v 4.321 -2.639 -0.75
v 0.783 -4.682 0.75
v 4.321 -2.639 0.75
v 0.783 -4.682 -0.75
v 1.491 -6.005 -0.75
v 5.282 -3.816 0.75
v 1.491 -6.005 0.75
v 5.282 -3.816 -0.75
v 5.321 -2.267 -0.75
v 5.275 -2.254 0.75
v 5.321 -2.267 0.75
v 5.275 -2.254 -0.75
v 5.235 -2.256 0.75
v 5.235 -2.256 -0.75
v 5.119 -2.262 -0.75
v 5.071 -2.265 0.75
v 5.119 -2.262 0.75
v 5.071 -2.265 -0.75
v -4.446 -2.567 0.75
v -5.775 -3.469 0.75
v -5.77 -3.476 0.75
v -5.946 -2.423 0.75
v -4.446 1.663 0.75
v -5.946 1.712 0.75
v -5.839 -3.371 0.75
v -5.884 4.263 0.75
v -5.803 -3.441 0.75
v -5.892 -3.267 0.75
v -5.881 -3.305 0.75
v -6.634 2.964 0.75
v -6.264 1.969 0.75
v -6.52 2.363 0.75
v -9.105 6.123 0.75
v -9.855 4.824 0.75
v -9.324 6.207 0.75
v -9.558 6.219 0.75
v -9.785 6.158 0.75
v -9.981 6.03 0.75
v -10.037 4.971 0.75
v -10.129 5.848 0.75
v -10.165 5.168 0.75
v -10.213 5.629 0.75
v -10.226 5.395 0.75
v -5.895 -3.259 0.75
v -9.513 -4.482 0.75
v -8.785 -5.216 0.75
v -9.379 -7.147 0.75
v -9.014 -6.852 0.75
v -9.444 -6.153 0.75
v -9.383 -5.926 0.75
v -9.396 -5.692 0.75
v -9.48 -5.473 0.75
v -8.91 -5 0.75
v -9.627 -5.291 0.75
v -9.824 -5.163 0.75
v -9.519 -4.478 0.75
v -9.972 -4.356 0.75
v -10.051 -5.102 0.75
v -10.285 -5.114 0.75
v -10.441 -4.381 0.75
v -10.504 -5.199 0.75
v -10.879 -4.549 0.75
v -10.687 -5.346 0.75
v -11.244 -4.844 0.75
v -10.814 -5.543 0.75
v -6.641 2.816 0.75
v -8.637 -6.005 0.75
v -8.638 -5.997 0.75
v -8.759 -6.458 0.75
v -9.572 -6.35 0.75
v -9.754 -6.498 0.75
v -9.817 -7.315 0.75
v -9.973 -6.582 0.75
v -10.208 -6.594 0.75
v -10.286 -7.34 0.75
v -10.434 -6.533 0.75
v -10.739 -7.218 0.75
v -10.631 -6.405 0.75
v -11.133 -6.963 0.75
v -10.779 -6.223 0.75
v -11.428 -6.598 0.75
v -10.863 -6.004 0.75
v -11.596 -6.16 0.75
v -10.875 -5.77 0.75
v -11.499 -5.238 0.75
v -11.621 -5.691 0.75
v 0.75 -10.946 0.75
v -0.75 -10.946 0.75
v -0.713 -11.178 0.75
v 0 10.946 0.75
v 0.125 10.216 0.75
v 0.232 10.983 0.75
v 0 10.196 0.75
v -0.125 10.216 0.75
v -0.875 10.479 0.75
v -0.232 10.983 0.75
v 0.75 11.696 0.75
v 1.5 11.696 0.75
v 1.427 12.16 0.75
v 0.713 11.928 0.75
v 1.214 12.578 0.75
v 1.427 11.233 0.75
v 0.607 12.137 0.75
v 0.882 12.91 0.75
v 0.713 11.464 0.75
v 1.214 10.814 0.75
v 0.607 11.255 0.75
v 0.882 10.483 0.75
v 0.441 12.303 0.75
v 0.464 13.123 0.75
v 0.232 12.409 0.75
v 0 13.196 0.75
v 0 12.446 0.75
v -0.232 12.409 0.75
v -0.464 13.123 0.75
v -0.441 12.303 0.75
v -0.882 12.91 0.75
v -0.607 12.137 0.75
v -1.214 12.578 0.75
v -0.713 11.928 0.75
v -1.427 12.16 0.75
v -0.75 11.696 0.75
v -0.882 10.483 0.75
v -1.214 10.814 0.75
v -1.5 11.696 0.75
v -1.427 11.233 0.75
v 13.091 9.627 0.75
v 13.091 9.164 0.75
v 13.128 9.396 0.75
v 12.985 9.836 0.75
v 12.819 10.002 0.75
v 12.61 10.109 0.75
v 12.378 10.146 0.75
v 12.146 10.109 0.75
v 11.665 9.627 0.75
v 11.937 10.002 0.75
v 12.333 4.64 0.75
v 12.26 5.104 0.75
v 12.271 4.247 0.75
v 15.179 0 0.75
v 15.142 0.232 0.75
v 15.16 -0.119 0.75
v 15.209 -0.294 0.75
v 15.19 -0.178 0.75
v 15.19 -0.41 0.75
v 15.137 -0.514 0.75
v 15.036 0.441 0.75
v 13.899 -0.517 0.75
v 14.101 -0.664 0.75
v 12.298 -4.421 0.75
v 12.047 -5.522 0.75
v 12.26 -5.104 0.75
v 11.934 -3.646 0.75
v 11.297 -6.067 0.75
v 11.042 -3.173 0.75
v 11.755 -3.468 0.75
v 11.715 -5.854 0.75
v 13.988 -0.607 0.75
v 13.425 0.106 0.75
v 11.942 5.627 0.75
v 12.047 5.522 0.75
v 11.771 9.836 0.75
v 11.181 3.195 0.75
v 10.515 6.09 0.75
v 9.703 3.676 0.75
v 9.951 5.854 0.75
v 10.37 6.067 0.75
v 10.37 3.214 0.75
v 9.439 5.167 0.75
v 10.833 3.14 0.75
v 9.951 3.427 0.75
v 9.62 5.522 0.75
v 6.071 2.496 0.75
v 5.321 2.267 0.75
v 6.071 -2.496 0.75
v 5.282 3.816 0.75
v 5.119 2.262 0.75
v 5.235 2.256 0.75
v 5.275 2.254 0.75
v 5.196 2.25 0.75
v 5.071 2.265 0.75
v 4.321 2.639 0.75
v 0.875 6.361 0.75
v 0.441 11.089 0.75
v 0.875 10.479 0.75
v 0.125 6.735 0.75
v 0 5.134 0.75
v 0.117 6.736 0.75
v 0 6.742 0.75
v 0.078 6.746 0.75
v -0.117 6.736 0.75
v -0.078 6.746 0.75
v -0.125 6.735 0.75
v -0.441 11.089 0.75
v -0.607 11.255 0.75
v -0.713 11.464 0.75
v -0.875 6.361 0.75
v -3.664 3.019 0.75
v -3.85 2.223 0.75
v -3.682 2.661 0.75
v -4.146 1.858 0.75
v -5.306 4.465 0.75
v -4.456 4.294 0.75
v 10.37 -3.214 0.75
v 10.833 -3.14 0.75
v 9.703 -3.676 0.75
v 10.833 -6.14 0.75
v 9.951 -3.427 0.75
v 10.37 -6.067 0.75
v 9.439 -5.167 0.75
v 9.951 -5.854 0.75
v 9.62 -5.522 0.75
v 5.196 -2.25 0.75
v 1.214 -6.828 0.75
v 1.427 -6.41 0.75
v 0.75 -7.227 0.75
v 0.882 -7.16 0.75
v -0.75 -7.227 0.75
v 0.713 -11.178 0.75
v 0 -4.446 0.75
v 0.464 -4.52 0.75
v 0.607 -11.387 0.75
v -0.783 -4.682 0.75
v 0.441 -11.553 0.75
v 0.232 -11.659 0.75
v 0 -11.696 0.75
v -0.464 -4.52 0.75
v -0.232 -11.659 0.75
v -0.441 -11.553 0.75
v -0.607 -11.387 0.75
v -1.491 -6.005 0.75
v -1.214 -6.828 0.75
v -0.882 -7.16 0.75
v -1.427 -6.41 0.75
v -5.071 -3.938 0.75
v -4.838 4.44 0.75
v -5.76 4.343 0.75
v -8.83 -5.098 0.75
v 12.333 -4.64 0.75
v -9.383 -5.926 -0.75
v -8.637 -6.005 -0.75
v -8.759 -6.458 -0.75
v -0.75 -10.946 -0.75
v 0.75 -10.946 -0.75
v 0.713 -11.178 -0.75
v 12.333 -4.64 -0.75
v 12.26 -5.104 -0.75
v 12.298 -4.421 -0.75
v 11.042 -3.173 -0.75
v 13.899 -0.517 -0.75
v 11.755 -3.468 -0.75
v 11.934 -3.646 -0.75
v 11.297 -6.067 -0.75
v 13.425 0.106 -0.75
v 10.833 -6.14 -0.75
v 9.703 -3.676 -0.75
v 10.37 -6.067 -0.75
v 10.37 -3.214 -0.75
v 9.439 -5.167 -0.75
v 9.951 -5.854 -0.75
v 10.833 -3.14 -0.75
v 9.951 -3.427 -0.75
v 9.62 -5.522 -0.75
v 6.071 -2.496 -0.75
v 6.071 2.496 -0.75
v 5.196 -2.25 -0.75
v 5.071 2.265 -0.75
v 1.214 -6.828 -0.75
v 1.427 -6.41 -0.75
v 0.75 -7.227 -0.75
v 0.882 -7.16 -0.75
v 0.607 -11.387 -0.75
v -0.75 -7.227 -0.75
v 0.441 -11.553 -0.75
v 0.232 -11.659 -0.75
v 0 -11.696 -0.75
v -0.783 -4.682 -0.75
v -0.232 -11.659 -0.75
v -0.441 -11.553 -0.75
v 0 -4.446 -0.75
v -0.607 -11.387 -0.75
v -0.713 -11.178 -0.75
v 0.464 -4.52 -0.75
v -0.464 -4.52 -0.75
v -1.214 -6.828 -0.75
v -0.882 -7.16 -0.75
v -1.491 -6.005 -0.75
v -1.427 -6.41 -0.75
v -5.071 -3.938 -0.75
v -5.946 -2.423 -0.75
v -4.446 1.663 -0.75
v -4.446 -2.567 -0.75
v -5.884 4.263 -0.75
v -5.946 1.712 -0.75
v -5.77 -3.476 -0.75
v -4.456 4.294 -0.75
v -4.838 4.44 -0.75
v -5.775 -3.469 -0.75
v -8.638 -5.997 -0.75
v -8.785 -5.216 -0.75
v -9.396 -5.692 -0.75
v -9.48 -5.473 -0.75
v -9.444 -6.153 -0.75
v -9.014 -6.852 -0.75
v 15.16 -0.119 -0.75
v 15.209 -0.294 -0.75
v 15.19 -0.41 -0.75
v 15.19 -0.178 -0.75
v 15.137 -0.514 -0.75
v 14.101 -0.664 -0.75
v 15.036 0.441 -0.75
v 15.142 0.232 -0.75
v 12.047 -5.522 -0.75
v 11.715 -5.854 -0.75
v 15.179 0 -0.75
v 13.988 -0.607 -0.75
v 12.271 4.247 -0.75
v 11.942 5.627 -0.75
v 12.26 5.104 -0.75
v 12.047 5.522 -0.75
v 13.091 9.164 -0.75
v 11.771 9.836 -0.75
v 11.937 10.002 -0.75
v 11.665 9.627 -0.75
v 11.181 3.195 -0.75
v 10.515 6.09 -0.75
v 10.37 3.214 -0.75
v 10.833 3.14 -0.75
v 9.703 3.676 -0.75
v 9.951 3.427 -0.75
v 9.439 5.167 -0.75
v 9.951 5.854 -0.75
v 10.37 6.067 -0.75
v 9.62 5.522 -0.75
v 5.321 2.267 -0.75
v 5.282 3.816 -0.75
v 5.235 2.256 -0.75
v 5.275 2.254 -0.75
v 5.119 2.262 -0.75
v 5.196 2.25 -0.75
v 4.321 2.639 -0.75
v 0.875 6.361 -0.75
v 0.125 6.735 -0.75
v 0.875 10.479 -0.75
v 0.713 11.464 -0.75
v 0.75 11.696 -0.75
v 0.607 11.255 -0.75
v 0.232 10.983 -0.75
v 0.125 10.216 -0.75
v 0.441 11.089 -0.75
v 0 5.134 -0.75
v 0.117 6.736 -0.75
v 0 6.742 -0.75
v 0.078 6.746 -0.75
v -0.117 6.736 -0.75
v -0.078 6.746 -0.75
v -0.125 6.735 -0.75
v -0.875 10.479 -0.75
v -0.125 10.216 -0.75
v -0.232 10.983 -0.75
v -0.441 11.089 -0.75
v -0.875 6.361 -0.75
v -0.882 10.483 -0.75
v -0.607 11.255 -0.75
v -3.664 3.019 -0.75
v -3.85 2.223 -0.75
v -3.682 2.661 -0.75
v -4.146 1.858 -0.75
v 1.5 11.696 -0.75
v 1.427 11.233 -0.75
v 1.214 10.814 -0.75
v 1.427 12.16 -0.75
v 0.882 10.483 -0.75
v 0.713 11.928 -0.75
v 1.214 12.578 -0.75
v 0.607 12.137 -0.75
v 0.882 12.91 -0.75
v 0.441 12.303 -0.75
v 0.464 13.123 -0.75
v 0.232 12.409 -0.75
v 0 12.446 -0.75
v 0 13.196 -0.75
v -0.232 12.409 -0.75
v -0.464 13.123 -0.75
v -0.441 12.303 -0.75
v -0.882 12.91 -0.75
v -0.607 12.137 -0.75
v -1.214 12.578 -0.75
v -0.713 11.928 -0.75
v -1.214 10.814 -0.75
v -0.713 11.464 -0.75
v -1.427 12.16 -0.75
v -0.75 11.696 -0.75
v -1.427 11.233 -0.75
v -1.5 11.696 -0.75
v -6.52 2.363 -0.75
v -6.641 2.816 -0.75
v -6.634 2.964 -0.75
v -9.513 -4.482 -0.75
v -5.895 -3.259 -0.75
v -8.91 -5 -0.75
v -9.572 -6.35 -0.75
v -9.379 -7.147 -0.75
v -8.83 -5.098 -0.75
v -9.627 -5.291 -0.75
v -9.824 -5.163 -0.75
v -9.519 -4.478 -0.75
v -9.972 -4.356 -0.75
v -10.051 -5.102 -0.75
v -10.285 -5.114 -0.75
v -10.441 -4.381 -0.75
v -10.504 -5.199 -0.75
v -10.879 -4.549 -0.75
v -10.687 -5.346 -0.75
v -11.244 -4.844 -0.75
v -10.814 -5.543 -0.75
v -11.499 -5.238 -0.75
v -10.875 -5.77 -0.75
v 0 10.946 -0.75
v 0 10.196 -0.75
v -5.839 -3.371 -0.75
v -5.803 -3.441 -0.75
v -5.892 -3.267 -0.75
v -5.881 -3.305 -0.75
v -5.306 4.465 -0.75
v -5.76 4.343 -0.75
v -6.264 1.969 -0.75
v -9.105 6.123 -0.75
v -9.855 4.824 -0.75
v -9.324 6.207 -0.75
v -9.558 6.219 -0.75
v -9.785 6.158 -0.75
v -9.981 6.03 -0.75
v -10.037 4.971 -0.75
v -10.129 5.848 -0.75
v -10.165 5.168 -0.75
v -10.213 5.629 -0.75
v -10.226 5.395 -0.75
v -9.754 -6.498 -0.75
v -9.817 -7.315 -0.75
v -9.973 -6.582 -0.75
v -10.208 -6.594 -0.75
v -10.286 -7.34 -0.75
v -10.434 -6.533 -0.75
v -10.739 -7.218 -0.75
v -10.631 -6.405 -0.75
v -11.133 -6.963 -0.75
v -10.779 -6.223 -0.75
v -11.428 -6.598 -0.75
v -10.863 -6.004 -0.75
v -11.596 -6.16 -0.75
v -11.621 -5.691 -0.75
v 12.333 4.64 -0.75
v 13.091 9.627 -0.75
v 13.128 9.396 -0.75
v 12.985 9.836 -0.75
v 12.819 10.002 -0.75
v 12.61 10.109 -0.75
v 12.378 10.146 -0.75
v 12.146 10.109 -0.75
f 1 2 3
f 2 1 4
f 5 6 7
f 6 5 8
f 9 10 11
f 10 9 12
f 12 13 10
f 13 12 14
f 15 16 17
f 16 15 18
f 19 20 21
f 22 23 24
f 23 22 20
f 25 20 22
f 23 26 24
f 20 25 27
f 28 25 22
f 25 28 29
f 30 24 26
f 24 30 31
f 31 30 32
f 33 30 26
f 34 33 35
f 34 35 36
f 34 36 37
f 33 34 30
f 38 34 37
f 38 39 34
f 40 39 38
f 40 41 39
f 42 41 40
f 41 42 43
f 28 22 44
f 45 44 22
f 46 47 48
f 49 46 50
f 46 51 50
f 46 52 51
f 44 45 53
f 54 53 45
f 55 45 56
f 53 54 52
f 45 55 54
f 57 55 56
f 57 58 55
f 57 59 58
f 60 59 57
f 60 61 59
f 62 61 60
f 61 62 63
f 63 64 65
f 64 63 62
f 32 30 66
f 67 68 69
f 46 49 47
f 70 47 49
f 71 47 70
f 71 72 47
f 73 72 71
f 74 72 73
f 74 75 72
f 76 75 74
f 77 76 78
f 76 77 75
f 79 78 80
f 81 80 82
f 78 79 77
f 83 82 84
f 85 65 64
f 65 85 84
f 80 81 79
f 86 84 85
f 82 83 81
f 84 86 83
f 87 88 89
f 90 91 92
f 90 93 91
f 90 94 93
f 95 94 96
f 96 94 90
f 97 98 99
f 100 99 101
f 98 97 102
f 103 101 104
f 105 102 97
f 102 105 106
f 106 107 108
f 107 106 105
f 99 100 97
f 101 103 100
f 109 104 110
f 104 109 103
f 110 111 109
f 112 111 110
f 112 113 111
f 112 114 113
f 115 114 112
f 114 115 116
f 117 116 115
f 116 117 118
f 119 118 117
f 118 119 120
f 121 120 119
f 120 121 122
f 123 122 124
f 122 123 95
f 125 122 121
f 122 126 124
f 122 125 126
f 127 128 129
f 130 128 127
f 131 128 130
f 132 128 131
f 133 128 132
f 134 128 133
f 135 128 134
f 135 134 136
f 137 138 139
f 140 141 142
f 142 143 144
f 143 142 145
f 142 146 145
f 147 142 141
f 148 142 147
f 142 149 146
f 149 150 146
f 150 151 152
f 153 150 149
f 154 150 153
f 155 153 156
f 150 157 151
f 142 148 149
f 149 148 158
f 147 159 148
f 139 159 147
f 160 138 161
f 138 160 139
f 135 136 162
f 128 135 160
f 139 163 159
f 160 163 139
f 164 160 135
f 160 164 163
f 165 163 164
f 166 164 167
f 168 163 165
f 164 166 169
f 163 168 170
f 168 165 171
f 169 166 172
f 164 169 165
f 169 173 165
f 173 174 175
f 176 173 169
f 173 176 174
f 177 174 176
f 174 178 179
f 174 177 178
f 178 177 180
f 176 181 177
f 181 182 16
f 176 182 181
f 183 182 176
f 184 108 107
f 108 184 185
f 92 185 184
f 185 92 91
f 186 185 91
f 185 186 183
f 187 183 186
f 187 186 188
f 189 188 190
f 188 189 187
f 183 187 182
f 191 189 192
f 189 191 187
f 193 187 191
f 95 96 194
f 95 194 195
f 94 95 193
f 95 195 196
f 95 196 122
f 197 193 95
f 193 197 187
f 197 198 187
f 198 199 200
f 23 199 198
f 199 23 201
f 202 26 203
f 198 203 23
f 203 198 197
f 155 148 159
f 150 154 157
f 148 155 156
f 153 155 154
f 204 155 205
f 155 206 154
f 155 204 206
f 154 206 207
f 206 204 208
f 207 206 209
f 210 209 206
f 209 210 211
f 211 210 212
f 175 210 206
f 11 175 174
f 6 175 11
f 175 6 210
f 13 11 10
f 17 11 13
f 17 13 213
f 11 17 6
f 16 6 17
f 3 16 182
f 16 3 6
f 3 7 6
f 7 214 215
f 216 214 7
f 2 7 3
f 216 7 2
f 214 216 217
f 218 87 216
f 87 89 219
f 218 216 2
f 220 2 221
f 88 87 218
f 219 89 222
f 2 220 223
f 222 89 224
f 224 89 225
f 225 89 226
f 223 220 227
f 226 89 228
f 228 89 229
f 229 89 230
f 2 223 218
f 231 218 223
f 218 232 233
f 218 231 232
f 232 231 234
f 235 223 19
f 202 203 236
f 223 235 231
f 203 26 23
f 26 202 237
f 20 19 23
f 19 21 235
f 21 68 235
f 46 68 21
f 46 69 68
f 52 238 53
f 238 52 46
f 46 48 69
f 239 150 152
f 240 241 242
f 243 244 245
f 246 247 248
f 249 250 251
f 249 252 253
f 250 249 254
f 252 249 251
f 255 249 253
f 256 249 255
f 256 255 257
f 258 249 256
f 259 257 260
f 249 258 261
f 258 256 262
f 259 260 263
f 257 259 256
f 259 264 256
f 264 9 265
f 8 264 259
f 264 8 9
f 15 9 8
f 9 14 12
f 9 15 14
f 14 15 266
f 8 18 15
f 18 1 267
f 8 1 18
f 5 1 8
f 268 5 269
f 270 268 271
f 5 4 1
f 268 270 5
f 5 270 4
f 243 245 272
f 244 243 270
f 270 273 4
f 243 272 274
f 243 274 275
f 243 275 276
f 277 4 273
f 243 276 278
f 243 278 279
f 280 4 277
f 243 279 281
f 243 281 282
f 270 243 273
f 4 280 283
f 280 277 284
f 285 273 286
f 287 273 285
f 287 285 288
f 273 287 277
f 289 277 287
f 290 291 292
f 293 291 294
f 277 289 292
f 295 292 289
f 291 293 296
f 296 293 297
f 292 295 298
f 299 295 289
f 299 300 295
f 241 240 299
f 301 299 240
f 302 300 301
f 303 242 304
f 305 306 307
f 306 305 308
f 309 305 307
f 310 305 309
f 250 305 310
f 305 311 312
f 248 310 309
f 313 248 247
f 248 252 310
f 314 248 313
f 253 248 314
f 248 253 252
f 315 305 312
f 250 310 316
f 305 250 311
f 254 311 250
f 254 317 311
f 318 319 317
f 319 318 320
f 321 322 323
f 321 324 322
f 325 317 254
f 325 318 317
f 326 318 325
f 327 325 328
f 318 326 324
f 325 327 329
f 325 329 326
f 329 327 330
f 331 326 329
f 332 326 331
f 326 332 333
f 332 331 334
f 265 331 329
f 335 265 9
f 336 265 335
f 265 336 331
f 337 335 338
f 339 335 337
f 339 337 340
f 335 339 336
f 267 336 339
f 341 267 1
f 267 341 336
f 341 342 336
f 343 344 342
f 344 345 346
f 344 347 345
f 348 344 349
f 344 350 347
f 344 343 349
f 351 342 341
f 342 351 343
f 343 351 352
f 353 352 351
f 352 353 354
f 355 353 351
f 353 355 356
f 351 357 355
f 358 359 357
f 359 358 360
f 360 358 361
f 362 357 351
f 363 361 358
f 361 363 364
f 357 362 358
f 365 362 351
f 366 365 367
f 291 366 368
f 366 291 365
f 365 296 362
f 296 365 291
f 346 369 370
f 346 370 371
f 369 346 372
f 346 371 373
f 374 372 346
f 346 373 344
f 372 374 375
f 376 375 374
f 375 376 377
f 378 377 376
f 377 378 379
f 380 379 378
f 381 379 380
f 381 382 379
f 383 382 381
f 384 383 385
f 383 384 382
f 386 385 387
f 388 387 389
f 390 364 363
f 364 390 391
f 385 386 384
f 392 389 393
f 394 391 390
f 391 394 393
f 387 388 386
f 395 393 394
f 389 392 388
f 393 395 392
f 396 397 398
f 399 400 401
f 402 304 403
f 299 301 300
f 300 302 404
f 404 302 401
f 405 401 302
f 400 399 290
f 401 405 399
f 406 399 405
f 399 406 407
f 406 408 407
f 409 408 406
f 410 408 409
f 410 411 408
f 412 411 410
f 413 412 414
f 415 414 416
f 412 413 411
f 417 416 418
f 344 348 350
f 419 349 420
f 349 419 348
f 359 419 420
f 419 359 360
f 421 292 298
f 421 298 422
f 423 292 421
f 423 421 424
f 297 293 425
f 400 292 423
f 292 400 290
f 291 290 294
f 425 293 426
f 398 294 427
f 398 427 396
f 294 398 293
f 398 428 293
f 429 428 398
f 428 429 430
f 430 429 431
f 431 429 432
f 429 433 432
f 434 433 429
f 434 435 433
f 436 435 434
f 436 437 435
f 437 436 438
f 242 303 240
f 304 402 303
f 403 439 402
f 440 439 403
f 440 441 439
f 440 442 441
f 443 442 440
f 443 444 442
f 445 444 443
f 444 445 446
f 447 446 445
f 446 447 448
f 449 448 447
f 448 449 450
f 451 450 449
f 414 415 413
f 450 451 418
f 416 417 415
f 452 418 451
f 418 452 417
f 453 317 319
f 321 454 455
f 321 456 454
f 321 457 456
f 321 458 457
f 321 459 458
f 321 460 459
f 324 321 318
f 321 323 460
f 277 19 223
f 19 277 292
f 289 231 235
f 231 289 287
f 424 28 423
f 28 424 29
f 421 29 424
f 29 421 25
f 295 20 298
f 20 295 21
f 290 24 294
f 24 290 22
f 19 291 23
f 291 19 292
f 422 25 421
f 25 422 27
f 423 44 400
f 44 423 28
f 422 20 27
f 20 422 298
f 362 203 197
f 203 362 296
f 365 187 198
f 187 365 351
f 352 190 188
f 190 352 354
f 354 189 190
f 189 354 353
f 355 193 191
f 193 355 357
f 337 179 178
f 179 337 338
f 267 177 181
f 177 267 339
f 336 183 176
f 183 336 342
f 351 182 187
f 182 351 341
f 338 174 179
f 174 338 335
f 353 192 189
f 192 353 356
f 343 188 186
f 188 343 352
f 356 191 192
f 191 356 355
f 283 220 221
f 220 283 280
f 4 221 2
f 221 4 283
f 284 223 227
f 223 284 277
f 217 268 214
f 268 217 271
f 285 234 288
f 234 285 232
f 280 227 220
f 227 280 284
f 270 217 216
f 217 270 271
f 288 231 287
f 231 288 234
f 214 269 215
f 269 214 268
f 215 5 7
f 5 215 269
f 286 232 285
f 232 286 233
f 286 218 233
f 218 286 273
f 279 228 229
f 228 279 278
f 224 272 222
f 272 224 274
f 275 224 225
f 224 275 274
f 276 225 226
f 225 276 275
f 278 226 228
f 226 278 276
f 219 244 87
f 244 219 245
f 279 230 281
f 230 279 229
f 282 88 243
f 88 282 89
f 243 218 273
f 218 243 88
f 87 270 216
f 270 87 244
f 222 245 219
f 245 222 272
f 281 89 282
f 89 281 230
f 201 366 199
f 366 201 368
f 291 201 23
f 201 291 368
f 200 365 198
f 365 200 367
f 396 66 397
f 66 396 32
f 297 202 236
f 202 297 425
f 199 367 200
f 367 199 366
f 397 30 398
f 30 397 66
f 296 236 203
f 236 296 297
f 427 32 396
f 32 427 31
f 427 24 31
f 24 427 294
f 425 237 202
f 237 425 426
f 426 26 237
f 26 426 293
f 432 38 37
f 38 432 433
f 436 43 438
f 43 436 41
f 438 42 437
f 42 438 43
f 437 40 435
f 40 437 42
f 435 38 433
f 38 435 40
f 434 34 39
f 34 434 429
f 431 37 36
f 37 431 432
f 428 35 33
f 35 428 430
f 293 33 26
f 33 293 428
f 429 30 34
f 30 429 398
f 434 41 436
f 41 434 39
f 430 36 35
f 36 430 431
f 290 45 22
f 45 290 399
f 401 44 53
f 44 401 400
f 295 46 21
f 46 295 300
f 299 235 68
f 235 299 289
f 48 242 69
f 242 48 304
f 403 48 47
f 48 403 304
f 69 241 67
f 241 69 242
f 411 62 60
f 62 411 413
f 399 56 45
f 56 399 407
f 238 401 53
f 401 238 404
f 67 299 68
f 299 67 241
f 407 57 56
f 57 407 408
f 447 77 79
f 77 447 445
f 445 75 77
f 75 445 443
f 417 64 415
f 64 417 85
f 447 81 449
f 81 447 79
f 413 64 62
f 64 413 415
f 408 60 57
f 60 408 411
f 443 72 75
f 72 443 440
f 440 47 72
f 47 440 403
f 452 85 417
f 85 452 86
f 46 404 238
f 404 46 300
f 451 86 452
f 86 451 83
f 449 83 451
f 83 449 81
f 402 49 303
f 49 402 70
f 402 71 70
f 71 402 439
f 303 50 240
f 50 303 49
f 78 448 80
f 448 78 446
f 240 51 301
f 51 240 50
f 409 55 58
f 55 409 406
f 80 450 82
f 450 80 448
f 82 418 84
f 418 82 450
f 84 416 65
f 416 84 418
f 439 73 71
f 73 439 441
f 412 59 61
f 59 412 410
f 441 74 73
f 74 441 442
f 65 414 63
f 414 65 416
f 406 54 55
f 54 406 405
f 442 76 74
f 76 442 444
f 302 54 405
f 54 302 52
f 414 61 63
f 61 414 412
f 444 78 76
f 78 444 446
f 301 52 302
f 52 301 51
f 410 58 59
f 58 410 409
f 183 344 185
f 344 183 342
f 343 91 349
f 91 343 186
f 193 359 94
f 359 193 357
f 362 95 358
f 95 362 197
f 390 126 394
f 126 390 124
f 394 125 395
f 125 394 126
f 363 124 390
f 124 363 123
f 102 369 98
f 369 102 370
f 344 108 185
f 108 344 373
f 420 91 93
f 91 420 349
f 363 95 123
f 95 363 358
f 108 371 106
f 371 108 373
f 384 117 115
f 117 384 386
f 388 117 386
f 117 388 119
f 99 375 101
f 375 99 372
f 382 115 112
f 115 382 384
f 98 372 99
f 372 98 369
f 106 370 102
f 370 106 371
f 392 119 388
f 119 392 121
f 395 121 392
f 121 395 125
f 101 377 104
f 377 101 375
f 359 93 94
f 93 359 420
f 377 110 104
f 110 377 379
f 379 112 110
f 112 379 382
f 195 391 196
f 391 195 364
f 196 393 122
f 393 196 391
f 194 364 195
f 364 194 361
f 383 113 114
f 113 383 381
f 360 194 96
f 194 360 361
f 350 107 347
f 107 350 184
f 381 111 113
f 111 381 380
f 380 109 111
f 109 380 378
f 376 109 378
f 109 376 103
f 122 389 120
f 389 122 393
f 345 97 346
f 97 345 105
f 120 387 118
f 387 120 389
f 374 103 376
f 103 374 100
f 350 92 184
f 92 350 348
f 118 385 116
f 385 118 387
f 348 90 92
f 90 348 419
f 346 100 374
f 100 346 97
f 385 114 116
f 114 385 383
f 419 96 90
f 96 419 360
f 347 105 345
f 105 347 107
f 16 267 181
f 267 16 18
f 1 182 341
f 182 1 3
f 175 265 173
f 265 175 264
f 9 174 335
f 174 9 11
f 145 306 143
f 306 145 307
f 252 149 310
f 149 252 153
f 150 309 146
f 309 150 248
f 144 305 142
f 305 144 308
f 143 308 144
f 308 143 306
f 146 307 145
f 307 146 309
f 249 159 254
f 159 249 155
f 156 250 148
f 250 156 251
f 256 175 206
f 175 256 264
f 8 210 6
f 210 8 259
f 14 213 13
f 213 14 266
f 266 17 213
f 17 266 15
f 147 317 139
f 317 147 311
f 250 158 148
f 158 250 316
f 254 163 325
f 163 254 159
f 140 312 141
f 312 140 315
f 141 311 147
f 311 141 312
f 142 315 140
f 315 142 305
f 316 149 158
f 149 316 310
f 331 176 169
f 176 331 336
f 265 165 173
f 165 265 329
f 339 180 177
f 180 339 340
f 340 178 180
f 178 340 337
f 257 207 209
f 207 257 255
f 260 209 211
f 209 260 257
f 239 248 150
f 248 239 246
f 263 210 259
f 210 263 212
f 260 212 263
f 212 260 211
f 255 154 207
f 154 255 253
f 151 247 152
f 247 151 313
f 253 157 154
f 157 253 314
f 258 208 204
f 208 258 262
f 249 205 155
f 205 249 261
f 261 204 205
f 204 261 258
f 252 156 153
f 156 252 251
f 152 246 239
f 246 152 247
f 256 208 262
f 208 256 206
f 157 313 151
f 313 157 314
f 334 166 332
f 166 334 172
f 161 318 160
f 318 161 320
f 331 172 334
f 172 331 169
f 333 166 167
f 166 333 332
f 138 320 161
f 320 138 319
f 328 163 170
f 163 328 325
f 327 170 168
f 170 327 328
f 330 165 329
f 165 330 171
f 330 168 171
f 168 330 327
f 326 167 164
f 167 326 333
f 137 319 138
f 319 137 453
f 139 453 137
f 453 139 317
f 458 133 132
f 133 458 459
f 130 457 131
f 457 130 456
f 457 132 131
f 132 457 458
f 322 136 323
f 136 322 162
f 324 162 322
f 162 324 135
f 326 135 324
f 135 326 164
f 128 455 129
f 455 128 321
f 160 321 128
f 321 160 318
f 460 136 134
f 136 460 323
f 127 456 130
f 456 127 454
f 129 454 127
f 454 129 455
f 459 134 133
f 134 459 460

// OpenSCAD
$fn=20;
eps = 0.01;

// simple bond of width d, height h and length l
// '-> centered in the middle of its length
module bond(d=1, h=1, l=10){
    hull(){
        translate([l/2,0,0])
            cylinder(d=d,h=h,center=true);
        translate([-l/2,0,0])
            cylinder(d=d,h=h,center=true);
    }
}

// carbon cycle
// '-> a is width and height of the bonds
// '-> l is lenght of the bond
// '-> nc is number of carbons in cycle e.g. number of sizes
// '-> bm is array of bond mulitplicity
//     '-> 0 means no bond
//     '-> 1 is a single bond
//     '-> 2 is a double bond
//     '-> other multiplicity is not considered
module c_cycle(a,l,nc,bm)
{
    _l = l;
    _is_double = bm;
    _inc_a = 360/nc;
    _r = -(_l/2)/tan(_inc_a/2);
    for(i=[0:nc])
    {
        rotate([0,0,-i*_inc_a+90])
        translate([0,_r,0])
        {
            if(_is_double[i]==1)
            {
                bond(d=a,h=a,l=_l);
            } else if(_is_double[i]==2)
            {
                translate([0,-a/3,0])
                    bond(d=a/2,h=a,l=l);
                translate([0,a/3,0])
                    bond(d=a/2,h=a,l=l);
            }
        }       
    }
}


// utility for appending chains or replacing carbons with nitrogen
// '-> same interface as cycle
// '-> a is width and height of the bonds
// '-> l is lenght of the bond
// '-> nc is number of carbons in cycle e.g. number of sizes
// '-> im is array determinig whether there is a modification
//     '-> 0 means no modification
//     '-> 1 is a modification on particular position
//     '-> other multiplicity is not considered
// '-> children object is considered as chain or nitrogem
module c_appender(a,l,nc,im)
{
    _l = l;
    _is_modified = im;
    _inc_a = 360/nc;
    _r = -(_l/2)/tan(_inc_a/2);
    for(i=[0:nc])
    {
        if(_is_modified[i])
        {   
            rotate([0,0,-i*_inc_a+_inc_a/2+90])
                translate([0,_r-a/2,0])
                    children(0);
        }       
        
    }
}

module caffeine()
{

    _a = 1.5;
    _l = 6;
    // left cycle
    c_cycle(a=_a,l=_l,nc=6,bm=[0,1,1,1,1,1]);
    // adding nitrogen with methyl chain
    c_appender(a=_a,l=_l,nc=6,im=[0,0,1,0,1,0]){
        translate([0,0,-_a/2])
        {
            // nitrogen
            cylinder(h=_a,r=_a);
            // methyl radical
            _lo = 5;
            hull()
            {
                cylinder(h=_a,d=_a);
                translate([0,-_lo,0])
                    cylinder(h=_a,d=_a);
            }
            
        }
    };

    // adding oxigen with hole
    c_appender(a=_l,l=_l,nc=6,im=[0,0,0,1,0,1]){
        _lo = 5;
        difference()
        {
        union()
        {
            // double bond
            translate([0,0,0])
                rotate([0,0,90])    
                {
                    translate([0,_a/3,0])    
                        bond(h=_a,d=_a/2,l=_lo);
                    translate([0,-_a/3,0])
                        bond(h=_a,d=_a/2,l=_lo);
                }
            translate([0,-_lo+_a,-_a/2])   
                cylinder(h=_a,r=_a);
        }
                translate([0,-_lo+_a,-_a/2-eps])   
            cylinder(h=_a+2*eps,d=_a);
        }
    };

    // right cycle
    _ro = +(_l/2)/tan((360/6)/2) +(_l/2)/tan((360/5)/2);
    translate([_ro,0,0])
    rotate([0,180,0])
    {
        // main cycle
        c_cycle(a=_a,l=_l,nc=5,bm=[2,1,2,1,1]);
        
        // '-> adding nitrogens
        c_appender(a=_a,l=_l,nc=5,im=[0,0,1,0,1,0])
        {
            translate([0,0,-_a/2]) cylinder(h=_a,r=_a);
        }
        
        // '-> adding methyl radical
        c_appender(a=_a,l=_l,nc=5,im=[0,0,0,0,1,0]){
            _lo = 5;
            translate([0,0,-_a/2])
                hull()
                {
                    cylinder(h=_a,d=_a);
                    translate([0,-_lo,0])
                        cylinder(h=_a,d=_a);
                }
                
            
        };
    }
}

caffeine();
